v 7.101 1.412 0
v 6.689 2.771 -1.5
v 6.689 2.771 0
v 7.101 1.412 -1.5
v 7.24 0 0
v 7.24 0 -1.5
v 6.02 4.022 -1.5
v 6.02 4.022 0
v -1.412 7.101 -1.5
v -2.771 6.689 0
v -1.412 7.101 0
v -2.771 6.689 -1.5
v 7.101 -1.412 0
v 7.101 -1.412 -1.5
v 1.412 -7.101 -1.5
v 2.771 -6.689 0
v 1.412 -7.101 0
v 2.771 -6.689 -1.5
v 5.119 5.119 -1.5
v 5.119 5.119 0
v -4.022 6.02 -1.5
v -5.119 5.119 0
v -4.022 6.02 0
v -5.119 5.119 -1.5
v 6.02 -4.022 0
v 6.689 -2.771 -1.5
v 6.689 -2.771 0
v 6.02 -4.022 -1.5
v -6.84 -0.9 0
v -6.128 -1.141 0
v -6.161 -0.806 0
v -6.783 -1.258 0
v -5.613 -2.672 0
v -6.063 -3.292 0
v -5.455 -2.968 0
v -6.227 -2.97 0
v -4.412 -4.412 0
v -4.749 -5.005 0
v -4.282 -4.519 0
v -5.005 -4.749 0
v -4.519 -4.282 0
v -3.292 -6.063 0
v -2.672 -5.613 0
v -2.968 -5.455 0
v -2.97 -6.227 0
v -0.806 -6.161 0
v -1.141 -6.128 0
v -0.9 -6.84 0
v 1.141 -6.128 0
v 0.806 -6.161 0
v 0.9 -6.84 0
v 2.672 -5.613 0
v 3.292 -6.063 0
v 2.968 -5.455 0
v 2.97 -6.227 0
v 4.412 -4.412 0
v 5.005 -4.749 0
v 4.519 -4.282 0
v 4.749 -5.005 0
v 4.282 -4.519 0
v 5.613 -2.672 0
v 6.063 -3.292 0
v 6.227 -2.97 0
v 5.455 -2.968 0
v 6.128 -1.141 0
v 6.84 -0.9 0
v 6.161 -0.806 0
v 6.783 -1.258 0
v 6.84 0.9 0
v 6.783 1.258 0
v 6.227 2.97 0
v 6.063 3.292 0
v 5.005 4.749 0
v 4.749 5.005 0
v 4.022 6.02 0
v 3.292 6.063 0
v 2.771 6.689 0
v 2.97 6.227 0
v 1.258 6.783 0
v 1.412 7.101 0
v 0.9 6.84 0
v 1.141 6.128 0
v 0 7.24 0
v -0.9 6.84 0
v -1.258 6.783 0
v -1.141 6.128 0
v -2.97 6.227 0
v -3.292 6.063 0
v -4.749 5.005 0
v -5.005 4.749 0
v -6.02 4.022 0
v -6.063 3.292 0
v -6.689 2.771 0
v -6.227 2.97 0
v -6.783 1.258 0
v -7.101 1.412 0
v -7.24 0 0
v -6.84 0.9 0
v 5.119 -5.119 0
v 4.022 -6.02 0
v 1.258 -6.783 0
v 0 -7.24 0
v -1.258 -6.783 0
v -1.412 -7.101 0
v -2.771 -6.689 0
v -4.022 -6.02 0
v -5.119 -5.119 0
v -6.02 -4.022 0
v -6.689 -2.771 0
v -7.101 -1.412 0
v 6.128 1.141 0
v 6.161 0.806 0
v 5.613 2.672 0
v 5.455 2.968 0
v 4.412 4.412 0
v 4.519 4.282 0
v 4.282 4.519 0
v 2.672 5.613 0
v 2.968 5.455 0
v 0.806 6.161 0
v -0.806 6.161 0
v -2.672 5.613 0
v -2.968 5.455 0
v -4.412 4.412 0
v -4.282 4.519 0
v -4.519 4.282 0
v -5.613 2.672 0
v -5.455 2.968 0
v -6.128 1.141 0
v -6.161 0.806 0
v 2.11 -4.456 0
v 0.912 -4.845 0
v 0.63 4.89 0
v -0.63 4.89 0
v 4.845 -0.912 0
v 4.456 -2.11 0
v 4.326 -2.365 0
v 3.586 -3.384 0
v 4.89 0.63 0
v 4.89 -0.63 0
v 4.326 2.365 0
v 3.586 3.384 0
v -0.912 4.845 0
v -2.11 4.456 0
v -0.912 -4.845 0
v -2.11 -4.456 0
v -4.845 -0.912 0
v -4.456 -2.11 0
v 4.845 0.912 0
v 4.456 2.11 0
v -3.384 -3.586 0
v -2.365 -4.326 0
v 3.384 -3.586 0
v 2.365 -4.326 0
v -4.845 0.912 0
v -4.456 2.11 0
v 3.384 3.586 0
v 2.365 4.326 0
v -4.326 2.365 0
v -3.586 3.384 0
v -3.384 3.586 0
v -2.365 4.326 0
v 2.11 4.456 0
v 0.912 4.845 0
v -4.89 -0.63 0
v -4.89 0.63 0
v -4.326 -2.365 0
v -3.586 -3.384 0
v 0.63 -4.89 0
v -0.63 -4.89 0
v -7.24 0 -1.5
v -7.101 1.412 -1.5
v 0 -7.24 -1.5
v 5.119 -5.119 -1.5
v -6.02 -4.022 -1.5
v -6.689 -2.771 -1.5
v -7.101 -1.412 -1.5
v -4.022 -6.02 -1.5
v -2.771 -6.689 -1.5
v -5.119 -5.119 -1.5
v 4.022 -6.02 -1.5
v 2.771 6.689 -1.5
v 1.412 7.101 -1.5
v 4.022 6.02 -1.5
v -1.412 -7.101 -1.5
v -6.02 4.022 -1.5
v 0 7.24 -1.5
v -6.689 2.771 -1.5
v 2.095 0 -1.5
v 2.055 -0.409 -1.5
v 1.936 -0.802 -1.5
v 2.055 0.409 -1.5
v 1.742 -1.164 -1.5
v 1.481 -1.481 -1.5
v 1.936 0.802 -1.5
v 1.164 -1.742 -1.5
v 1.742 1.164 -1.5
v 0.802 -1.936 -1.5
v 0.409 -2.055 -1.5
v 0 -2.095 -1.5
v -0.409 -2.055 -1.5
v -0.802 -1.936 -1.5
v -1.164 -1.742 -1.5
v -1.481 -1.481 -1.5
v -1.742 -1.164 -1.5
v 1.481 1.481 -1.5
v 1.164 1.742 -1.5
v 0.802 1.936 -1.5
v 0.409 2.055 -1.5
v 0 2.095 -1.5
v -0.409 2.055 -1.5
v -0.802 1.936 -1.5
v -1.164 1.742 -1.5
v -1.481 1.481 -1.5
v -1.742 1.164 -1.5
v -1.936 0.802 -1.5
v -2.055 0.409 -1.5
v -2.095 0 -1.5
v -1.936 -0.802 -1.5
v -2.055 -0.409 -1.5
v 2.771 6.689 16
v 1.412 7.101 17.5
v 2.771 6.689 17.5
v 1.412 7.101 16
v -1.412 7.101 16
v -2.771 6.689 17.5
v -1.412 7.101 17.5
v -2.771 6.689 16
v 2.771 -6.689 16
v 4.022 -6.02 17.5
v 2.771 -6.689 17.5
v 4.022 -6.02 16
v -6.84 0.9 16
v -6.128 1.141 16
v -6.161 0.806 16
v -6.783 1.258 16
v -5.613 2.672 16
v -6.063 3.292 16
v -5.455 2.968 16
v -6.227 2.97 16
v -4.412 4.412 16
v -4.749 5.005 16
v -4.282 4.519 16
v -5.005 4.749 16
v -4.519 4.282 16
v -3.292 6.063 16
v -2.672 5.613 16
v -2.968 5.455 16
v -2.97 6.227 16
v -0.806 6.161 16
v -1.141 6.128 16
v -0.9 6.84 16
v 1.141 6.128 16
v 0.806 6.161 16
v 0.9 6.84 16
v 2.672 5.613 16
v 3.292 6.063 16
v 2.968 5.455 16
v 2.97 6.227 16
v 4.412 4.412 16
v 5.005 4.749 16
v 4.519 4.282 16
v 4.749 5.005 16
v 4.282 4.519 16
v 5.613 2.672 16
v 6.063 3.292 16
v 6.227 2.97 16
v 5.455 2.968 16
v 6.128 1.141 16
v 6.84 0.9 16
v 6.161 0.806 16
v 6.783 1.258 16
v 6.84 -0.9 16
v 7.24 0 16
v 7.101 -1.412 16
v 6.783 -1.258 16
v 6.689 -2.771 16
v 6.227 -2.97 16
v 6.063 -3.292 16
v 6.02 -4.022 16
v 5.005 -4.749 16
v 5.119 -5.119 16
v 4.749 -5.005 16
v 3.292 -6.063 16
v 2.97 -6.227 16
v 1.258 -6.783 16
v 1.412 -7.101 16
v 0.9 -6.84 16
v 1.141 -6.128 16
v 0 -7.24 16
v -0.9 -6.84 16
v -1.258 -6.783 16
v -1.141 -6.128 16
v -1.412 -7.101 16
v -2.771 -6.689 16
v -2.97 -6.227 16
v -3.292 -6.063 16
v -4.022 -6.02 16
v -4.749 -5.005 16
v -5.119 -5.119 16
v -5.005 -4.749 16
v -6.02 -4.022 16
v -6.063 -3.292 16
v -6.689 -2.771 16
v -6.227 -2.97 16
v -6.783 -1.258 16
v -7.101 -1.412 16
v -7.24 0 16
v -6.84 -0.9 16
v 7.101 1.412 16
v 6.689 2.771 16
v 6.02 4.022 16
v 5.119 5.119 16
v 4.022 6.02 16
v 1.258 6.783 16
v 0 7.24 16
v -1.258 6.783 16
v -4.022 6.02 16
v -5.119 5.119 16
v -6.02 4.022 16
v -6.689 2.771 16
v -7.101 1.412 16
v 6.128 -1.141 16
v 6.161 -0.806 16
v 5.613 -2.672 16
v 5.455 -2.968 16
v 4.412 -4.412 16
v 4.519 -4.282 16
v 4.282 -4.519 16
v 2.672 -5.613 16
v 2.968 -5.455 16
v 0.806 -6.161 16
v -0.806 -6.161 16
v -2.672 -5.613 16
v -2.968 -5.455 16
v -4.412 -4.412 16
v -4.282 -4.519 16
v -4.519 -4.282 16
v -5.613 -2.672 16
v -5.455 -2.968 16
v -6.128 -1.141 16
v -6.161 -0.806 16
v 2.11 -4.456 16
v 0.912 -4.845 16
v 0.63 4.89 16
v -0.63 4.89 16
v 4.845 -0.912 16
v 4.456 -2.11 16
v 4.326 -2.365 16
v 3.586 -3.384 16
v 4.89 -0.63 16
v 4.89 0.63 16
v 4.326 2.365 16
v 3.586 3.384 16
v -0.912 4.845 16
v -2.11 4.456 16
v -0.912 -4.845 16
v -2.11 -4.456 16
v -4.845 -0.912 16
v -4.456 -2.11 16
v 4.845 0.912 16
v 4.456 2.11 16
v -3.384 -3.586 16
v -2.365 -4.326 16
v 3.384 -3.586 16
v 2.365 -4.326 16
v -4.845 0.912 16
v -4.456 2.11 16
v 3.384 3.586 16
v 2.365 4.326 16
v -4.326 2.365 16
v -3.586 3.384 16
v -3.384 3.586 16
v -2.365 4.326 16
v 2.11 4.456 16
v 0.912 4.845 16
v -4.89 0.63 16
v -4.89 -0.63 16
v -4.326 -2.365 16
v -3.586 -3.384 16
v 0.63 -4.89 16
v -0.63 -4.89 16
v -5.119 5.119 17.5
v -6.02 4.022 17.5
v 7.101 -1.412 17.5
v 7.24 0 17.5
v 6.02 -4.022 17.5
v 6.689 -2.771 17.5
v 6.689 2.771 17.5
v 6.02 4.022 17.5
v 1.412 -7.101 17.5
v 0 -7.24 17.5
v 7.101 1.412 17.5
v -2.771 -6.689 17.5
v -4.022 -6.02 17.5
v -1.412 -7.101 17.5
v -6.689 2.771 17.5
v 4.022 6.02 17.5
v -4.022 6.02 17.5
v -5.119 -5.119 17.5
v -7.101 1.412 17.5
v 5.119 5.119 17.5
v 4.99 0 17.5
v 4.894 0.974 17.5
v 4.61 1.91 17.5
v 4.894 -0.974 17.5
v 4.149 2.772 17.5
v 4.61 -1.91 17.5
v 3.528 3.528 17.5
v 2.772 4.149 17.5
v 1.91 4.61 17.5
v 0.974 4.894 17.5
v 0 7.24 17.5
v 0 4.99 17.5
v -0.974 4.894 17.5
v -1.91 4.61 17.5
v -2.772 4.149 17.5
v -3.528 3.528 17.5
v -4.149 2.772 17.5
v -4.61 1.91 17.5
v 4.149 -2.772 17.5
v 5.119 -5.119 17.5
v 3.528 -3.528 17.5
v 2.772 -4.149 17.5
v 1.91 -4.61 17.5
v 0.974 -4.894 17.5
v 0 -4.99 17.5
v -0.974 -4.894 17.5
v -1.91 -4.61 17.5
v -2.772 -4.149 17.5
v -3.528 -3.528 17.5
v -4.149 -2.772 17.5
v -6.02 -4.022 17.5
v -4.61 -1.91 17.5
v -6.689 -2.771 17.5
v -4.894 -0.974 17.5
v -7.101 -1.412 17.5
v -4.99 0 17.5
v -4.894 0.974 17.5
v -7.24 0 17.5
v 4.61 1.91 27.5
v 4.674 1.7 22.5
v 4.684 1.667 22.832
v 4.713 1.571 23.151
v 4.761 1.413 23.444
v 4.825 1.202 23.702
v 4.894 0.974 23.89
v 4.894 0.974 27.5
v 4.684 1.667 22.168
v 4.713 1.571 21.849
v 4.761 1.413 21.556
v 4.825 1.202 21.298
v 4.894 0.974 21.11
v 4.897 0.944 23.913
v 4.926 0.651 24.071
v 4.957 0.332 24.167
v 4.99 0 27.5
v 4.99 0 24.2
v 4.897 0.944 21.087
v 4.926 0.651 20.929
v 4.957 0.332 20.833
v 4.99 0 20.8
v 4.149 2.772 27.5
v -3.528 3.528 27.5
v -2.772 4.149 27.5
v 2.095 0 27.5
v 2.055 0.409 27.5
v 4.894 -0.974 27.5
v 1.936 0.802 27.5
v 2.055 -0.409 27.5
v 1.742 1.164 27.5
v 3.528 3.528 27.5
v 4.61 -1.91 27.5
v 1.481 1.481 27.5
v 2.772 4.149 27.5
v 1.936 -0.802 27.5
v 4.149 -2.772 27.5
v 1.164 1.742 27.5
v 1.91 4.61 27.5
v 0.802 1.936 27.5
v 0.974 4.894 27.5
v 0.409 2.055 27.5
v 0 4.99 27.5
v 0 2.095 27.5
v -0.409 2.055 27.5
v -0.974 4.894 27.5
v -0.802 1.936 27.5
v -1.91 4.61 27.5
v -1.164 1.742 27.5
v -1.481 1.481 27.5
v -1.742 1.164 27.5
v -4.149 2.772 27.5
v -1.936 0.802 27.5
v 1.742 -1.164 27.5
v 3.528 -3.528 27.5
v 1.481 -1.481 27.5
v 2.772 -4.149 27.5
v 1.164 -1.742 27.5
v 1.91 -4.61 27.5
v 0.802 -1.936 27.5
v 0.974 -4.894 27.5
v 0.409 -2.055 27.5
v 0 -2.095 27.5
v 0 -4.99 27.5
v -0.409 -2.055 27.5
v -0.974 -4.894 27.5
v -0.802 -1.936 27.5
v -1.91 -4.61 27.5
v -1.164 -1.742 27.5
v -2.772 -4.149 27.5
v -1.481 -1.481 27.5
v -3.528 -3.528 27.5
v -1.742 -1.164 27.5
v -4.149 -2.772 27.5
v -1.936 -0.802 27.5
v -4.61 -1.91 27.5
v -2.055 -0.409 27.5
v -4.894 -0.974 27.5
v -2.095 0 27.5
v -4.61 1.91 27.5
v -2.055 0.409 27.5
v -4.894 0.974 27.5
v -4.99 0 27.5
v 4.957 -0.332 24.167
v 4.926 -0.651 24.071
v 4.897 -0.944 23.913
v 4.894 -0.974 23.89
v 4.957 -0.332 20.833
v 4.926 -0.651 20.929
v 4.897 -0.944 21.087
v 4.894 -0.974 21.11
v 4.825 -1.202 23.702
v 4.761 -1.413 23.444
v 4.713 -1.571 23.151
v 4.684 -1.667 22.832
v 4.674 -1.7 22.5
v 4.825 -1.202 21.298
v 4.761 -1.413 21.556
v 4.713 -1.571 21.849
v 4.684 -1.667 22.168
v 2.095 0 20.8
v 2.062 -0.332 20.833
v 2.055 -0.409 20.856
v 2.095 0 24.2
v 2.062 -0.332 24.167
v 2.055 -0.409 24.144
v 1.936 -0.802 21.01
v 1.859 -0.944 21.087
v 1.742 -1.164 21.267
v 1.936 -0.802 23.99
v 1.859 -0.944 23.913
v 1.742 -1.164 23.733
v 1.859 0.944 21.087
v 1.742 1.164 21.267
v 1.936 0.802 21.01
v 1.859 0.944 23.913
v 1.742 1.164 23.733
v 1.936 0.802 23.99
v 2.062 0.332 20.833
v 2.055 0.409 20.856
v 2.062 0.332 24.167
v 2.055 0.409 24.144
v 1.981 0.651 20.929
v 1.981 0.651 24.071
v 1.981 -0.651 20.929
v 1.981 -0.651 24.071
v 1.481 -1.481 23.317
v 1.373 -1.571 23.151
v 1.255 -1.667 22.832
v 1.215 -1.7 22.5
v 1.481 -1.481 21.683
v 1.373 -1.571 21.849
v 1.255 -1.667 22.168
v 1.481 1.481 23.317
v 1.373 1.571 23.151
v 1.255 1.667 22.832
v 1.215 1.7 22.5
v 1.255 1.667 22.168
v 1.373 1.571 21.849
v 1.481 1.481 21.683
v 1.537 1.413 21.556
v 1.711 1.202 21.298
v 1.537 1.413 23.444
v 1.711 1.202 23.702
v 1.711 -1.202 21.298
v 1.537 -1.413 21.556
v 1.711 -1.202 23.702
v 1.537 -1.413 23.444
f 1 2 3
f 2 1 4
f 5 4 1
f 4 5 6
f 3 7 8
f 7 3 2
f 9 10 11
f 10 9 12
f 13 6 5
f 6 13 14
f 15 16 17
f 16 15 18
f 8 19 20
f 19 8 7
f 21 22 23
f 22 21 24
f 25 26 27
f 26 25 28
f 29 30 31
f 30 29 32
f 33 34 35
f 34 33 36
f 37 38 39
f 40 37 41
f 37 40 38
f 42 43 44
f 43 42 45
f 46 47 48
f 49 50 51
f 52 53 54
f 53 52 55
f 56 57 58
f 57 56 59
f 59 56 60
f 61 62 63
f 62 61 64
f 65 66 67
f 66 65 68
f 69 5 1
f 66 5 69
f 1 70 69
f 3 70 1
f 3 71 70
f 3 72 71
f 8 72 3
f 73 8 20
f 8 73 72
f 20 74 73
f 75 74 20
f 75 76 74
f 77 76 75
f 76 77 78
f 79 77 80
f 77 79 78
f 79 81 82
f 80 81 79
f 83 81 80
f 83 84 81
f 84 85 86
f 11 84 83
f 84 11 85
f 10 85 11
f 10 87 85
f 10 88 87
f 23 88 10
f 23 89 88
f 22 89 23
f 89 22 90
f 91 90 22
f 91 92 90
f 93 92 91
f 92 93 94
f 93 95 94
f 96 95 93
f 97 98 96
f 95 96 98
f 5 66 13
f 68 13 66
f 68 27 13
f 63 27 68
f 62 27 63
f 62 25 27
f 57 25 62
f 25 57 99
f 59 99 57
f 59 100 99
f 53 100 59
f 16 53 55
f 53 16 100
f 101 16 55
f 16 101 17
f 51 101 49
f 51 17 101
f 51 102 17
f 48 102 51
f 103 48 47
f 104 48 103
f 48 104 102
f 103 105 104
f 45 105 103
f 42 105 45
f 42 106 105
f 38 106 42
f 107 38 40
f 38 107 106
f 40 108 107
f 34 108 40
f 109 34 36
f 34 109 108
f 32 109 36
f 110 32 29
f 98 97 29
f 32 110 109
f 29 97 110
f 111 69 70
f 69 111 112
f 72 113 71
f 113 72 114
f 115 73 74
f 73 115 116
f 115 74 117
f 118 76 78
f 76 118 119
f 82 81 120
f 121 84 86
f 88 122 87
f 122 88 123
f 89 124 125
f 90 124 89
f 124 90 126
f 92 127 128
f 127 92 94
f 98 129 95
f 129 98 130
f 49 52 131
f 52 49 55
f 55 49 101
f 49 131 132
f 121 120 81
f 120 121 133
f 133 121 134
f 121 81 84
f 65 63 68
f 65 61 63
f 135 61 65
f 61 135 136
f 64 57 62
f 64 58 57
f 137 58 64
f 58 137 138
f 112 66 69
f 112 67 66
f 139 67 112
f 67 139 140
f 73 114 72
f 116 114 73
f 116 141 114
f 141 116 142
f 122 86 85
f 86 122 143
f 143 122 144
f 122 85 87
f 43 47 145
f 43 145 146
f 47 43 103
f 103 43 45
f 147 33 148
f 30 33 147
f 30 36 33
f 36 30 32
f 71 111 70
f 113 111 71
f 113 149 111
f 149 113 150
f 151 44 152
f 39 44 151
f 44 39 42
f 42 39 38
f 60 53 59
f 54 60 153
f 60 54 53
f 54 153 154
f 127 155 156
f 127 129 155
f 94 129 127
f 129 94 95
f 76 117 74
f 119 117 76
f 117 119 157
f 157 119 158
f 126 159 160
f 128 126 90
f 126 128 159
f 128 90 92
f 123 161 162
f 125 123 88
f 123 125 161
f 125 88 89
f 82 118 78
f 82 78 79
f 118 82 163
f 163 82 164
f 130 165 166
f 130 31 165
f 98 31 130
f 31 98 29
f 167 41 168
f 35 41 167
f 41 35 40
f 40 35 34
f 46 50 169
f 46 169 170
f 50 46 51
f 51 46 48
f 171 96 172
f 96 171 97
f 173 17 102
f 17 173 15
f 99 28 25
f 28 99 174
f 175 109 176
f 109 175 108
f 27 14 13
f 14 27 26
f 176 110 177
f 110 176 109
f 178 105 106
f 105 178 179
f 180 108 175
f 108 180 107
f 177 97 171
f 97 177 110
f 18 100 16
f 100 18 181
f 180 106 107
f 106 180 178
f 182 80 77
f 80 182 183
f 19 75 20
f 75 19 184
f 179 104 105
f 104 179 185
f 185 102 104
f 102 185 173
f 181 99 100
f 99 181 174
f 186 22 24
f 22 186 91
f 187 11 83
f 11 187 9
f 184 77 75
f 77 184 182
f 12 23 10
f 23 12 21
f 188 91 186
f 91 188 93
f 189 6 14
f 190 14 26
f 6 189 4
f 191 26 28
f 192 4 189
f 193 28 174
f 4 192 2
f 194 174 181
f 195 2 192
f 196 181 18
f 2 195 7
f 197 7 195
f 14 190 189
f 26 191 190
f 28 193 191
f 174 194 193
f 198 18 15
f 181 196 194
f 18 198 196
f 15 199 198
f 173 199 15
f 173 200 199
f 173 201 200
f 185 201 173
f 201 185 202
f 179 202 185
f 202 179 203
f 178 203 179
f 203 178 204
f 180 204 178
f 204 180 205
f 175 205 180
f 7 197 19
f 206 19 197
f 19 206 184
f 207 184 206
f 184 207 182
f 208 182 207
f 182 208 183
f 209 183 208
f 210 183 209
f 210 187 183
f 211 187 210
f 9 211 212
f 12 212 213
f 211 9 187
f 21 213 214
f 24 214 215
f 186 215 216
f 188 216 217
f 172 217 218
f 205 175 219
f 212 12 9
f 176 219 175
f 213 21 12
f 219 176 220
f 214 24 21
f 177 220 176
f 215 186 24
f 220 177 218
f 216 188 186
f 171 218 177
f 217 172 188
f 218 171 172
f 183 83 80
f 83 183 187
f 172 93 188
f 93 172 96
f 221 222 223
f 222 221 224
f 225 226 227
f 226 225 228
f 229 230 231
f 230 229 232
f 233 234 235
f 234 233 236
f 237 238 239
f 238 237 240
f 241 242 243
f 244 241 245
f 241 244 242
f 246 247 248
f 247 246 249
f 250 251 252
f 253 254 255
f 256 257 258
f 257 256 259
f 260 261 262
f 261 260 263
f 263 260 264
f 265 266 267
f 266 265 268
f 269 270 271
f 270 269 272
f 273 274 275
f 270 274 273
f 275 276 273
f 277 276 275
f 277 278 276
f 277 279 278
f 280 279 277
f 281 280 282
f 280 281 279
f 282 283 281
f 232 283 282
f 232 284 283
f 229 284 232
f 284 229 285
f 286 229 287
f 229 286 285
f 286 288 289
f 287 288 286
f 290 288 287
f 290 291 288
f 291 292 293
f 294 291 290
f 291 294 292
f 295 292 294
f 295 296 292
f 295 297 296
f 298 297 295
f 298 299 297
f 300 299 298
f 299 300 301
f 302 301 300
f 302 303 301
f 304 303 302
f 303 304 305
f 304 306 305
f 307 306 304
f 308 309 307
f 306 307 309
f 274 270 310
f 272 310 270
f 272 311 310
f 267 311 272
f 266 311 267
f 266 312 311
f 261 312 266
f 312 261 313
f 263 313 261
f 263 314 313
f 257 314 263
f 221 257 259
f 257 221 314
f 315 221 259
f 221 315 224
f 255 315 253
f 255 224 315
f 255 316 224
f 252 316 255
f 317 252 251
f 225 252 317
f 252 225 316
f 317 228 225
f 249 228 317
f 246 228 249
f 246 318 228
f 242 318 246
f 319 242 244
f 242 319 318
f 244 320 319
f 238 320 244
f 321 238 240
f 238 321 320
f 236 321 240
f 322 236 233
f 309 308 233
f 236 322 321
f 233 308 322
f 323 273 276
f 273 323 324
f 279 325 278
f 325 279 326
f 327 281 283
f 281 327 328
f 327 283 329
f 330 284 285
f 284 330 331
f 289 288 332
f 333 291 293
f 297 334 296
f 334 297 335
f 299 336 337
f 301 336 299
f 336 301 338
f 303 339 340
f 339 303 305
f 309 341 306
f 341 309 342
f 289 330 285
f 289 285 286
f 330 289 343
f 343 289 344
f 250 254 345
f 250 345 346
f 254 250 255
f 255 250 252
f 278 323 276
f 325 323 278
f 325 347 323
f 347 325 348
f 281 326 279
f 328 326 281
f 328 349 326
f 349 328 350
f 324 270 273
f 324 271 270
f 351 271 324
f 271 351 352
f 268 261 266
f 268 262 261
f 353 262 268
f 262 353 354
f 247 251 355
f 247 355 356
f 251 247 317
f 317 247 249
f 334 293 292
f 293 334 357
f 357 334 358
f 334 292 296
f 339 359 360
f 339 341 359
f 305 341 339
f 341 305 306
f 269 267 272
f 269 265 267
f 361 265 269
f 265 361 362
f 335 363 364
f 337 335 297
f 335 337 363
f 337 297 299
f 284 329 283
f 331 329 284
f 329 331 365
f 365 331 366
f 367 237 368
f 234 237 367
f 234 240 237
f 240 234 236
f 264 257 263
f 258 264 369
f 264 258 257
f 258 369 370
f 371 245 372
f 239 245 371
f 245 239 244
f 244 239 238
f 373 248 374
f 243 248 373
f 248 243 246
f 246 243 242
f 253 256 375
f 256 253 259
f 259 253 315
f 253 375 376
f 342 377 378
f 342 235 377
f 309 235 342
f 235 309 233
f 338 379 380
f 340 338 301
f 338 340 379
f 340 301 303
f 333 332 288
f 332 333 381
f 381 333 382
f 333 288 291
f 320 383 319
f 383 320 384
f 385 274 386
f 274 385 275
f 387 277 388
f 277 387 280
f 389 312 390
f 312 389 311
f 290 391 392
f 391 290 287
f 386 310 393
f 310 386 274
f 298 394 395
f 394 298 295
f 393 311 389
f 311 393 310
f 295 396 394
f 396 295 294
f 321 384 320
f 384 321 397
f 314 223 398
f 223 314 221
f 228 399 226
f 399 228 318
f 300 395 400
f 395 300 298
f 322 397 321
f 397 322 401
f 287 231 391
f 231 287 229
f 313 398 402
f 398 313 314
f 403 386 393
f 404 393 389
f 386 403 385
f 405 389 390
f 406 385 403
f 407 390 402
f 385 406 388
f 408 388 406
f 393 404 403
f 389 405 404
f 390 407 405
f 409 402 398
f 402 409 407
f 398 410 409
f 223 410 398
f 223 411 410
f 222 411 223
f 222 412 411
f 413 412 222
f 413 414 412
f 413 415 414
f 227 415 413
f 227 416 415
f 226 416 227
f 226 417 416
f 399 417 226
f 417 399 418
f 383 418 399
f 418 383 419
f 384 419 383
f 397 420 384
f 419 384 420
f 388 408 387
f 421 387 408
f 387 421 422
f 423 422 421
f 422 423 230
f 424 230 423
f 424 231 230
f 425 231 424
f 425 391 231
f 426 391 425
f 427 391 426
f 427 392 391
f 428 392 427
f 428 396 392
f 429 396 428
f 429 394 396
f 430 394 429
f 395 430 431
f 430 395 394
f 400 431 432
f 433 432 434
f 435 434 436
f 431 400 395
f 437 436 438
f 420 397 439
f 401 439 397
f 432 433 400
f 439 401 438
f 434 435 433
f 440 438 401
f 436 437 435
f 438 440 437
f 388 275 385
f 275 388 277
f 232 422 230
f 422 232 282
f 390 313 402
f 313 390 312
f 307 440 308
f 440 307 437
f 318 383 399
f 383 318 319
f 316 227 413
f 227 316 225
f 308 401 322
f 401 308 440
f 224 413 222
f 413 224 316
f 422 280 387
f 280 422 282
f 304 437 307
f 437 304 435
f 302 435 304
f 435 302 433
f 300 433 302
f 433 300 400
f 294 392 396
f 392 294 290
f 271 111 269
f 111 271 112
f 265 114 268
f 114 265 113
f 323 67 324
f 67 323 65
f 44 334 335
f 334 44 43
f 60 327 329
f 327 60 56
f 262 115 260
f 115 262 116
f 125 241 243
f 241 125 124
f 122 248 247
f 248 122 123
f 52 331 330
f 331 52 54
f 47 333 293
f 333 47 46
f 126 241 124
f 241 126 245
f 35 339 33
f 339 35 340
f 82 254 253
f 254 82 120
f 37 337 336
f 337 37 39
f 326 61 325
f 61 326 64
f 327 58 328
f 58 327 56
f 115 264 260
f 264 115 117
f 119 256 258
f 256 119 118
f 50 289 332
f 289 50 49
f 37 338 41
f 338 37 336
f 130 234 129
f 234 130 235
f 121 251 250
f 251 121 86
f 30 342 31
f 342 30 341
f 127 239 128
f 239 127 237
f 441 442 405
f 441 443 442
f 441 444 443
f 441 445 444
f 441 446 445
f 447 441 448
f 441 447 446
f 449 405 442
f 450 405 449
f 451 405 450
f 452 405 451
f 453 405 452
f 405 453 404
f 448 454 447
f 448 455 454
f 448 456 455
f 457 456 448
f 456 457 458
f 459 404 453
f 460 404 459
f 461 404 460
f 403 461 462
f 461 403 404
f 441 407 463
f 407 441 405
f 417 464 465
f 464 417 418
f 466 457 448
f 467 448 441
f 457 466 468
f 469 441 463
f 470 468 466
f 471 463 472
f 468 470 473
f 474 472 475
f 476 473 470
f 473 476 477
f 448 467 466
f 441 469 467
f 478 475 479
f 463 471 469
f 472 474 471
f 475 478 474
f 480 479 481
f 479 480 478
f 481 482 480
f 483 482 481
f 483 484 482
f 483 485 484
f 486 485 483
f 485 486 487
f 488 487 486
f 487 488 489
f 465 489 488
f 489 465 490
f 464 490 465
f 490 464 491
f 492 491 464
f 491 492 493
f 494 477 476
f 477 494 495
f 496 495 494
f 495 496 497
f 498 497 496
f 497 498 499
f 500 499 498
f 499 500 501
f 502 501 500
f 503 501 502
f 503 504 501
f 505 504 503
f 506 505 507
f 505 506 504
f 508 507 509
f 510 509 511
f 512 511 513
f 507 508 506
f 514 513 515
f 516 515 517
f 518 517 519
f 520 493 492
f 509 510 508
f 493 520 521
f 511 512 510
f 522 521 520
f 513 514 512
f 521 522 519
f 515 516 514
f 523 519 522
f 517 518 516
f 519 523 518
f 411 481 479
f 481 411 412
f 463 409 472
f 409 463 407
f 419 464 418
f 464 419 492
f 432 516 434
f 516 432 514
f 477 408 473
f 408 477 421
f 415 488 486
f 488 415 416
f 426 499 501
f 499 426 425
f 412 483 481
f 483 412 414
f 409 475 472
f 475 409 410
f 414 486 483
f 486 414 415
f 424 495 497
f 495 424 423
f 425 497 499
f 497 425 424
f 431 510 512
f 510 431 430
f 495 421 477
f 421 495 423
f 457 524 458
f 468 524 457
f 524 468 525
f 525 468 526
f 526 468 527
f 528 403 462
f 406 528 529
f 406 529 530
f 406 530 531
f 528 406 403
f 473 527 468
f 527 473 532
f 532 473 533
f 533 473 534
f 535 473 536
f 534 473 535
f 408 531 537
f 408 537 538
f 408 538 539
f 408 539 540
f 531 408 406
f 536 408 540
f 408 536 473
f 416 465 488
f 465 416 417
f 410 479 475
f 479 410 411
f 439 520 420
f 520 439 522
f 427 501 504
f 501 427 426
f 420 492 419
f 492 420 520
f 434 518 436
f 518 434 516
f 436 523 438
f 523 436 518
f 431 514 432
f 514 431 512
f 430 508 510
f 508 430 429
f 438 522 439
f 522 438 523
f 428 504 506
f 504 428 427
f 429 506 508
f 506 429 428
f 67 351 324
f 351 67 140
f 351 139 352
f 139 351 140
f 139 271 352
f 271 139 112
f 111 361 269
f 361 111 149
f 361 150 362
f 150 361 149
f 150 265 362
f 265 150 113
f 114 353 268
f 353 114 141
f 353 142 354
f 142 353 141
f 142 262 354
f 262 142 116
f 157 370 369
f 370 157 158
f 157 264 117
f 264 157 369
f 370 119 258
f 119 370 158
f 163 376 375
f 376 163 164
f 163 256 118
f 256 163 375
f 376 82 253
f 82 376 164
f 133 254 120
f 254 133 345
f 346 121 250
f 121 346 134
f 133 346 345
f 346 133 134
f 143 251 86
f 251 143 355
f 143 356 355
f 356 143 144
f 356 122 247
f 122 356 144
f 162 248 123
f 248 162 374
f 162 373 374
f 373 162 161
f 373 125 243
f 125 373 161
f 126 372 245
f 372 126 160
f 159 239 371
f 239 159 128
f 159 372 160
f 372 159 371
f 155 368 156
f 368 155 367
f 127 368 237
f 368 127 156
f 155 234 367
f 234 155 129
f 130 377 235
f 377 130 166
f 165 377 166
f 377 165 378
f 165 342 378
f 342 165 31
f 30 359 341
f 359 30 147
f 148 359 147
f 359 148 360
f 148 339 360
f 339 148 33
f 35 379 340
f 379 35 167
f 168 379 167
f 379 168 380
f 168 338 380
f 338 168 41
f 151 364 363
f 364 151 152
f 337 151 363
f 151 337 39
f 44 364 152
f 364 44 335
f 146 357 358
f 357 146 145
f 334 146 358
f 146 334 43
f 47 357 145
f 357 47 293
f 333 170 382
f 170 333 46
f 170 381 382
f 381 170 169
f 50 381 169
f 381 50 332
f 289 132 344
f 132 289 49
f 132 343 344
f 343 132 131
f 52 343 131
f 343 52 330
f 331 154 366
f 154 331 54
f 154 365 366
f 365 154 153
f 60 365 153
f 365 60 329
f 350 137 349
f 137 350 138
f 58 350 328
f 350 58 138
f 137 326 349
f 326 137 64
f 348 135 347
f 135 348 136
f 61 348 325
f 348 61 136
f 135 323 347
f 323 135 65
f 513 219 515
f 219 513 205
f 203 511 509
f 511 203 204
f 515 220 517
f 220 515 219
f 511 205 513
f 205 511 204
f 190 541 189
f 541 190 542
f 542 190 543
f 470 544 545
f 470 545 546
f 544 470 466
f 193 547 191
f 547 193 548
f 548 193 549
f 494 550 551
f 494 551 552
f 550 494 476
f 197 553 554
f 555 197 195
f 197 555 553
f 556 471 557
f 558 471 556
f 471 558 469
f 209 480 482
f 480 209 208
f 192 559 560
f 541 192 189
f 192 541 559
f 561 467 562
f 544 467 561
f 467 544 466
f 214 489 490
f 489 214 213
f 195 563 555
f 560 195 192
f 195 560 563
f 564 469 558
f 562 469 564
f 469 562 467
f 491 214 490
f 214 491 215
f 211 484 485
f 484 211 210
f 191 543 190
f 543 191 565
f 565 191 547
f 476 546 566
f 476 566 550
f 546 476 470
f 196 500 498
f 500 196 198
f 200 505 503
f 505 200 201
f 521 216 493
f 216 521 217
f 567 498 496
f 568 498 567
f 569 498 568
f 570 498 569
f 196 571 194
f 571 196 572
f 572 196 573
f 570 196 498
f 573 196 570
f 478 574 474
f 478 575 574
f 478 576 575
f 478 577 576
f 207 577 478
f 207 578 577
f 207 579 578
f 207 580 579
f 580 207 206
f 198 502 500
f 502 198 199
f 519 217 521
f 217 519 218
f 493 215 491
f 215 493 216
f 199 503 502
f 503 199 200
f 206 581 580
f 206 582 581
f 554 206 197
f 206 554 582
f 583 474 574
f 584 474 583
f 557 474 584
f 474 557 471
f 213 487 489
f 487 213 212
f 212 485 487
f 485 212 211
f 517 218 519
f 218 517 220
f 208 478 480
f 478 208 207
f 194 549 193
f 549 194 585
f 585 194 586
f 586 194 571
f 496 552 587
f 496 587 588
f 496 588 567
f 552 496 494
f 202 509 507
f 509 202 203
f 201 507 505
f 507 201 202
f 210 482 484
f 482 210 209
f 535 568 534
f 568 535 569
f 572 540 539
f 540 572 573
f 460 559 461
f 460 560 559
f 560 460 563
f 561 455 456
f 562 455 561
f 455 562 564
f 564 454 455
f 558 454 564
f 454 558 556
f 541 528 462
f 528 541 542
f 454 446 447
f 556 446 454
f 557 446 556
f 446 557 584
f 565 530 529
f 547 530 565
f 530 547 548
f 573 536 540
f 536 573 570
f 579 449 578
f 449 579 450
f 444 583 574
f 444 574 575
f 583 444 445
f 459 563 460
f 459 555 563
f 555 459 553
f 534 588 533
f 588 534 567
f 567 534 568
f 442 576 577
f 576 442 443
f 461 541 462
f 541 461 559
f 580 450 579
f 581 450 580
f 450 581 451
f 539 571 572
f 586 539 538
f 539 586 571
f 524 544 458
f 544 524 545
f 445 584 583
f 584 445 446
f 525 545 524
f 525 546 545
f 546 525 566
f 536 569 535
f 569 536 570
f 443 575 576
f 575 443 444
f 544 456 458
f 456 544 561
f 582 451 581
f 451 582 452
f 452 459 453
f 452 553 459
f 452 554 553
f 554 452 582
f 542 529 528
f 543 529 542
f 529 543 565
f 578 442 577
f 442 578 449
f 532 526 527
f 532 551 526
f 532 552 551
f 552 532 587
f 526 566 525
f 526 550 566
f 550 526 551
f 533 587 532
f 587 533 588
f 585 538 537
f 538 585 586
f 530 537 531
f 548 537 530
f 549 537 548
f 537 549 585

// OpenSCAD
$fn = 32;

// ----------------------------------------------------------------------
// Timing pulley: GT2 20T, pitch 2 mm, 14.48 mm x 29 mm
// ----------------------------------------------------------------------

// --- parameters (mm) ---
belt_pitch = 2;           // belt pitch
n_teeth = 20;             // number of grooves
rim_w = 16;               // belt width between the flanges
tip_d = 12.48;            // tip circle diameter
root_d = 10.98;           // groove bottom diameter
groove_h = 0.75;          // groove depth
tooth_w = 1.5;            // groove width at the tip circle
rim_d = 14.48;            // flange diameter
rim_t = 1.5;              // flange thickness
spigot_d = 9.38;          // flange spigot, sunk into the rim
spigot_h = 1.2;           // spigot depth into the rim
shaft_d = 4.19;           // shaft bore
hub_d = 9.98;             // hub diameter
hub_h = 10;               // hub above the flange
bottom_z = -1.5;          // lowest point of the pulley
top_z = 27.5;             // highest point of the pulley
set_d = 3.4;              // set screw tap hole

module rim() {
  cylinder(h = rim_w, d = tip_d);
}

module groove_cutter() {
  /* belt tooth groove: deeper than wide, cut through the belt width */
  translate([root_d / 2, 0, 0])
    linear_extrude(height = rim_w)
      polygon(points = [[-0.6, -tooth_w * 0.42], [groove_h + 0.6, -tooth_w * 0.6],
                        [groove_h + 0.6, tooth_w * 0.6], [-0.6, tooth_w * 0.42]]);
}

module flanges() {
  translate([0, 0, -rim_t]) cylinder(h = rim_t, d = rim_d);
  translate([0, 0, rim_w]) cylinder(h = rim_t, d = rim_d);
  translate([0, 0, -spigot_h]) cylinder(h = spigot_h + 0.6, d = spigot_d);
  translate([0, 0, rim_w - 0.6]) cylinder(h = spigot_h + 0.6, d = spigot_d);
}

module hub() {
  translate([0, 0, bottom_z]) cylinder(h = top_z - bottom_z, d = hub_d);
}

difference() {
  union() {
    rim();
    hub();
    flanges();
  }
  for (i = [0 : n_teeth - 1]) rotate([0, 0, i * 360 / n_teeth]) groove_cutter();
  translate([0, 0, bottom_z - 1]) cylinder(h = top_z - bottom_z + 2, d = shaft_d);
  translate([-1, 0, top_z - hub_h * 0.5]) rotate([0, 90, 0]) cylinder(h = hub_d / 2 + 3, d = set_d);
}
